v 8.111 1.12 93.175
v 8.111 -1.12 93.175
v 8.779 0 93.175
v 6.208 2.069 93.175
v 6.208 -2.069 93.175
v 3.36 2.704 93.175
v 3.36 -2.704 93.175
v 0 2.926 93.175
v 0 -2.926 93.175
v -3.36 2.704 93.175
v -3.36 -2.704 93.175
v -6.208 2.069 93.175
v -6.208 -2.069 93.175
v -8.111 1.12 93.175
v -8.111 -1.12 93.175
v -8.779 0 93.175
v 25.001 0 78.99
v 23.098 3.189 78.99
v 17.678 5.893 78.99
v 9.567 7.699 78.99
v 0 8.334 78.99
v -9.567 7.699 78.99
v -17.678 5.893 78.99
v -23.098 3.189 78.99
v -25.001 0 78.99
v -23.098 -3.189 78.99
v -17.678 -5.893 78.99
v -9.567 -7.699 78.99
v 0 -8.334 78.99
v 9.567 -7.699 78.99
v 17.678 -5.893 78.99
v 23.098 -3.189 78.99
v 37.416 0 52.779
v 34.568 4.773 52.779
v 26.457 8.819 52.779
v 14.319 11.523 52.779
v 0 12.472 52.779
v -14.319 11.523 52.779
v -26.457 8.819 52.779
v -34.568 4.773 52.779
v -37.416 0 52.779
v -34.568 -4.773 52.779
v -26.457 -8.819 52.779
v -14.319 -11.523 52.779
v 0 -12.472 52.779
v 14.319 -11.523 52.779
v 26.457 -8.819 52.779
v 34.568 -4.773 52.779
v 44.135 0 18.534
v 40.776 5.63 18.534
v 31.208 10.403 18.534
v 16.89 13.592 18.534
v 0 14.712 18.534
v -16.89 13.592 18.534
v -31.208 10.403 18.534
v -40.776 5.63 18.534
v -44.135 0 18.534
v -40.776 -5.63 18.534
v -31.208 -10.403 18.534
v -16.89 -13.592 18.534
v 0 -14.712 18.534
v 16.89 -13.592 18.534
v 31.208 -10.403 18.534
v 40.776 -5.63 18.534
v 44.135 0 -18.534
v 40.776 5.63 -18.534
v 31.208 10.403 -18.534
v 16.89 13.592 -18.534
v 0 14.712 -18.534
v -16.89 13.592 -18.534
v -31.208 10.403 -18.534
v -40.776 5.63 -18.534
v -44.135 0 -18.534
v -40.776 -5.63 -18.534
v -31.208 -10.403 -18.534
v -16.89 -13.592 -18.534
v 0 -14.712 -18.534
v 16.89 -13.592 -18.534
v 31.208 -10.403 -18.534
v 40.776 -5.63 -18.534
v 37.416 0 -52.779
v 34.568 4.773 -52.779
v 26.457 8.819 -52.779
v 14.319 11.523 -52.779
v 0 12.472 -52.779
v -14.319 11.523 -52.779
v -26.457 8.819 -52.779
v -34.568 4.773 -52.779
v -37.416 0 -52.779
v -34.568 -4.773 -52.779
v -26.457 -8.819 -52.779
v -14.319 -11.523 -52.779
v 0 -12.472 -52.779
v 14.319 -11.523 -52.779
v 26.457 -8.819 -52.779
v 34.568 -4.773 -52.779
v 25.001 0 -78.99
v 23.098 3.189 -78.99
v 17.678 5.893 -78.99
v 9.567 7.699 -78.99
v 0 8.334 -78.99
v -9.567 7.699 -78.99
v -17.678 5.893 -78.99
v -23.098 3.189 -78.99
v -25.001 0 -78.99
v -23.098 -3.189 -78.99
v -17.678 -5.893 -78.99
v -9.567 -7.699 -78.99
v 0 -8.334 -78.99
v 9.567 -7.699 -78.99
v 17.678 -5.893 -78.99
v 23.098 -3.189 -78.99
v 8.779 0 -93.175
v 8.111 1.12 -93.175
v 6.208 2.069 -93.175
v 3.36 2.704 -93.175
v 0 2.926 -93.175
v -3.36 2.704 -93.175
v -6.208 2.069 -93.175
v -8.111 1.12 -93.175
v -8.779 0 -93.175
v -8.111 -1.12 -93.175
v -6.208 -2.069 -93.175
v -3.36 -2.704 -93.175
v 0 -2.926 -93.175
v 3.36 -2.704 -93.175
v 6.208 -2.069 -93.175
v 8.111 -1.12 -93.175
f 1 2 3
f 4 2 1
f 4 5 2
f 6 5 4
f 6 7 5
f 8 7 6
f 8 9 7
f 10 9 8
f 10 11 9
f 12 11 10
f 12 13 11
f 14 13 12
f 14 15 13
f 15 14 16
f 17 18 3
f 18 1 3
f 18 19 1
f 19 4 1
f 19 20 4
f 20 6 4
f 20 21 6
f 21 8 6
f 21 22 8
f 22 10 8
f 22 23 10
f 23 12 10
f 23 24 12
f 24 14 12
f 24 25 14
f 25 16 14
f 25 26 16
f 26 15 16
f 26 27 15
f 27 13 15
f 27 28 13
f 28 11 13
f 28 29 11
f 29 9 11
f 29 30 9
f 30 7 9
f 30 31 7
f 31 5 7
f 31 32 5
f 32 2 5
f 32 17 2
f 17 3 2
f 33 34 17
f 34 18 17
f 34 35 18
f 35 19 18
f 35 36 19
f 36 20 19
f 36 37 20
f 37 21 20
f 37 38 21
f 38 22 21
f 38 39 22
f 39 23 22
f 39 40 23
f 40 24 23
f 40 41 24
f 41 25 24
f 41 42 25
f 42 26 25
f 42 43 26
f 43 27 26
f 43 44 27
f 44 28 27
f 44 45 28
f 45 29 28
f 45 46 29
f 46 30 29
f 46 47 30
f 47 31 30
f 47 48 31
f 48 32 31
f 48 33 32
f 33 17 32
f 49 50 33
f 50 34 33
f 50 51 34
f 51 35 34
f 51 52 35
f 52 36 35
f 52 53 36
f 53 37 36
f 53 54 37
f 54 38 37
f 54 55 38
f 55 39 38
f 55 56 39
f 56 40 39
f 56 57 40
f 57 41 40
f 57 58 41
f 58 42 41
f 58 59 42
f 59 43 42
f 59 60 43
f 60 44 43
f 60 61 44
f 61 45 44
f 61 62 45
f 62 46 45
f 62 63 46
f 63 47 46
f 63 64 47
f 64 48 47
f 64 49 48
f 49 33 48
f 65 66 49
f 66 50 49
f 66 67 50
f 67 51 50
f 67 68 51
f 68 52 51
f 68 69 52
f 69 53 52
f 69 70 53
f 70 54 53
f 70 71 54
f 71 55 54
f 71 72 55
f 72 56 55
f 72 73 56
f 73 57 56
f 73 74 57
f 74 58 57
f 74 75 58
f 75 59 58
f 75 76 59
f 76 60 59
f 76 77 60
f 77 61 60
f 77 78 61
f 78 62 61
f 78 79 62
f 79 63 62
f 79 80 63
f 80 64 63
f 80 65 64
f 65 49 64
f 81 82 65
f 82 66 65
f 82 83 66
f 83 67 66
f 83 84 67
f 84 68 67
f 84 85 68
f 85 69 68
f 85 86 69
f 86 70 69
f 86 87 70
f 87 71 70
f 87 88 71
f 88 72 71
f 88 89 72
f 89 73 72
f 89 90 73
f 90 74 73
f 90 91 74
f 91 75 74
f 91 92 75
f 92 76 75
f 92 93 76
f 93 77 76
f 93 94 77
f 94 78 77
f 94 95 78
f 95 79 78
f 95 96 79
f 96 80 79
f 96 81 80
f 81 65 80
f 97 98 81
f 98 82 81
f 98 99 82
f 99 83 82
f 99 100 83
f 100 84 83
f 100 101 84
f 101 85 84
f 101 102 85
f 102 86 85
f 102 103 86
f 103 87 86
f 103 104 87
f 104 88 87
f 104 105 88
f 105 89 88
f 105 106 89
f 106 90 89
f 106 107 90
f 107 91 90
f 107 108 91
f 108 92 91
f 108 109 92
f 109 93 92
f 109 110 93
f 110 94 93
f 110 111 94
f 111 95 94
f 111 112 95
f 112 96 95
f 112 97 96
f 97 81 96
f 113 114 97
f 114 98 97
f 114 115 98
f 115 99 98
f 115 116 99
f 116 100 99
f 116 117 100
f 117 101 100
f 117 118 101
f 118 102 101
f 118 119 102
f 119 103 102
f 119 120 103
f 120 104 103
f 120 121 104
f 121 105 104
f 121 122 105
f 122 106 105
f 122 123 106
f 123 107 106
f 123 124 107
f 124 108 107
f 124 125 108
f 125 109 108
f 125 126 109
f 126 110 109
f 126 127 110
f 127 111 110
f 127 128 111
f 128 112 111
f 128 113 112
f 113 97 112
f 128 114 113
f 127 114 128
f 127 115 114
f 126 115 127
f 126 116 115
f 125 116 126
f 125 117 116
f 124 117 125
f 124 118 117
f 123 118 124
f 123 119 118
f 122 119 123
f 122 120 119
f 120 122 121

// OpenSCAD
// Generated by SolidPython 1.0.1 on 2020-07-29 00:46:48


scale(v = [9, 3, 19]) {
	sphere(r = 5);
}
/***********************************************
*********      SolidPython code:      **********
************************************************
 
# import packages: SolidPython
from solid import *
from solid.utils import *
from itertools import chain, combinations, permutations


class Resize:

    def __init__(self, scad_file):
        self.scad_file = scad_file
        #self.scad_file = import_scad(scad_file)
        # cone/cylinder param:
        self.r1 = 0
        self.r2 = 0
        self.h = 0
        # rectangular prism param:
        self.w = 0
        self.l = 0
        # ellipse param:
        self.r = 0

    # import OpenScad code (file name corresponds to shape)


    # classify shape + parameters
    def assign(self, param1, param2, param3):
        if self.scad_file == 'cone.scad':
            self.r1 = param1
            self.r2 = param2
            self.h = param3
        elif self.scad_file == 'cylinder.scad':
            self.r1 = param1
            self.r2 = param2
            self.h = param3
        elif self.scad_file == 'rectangularPrism.scad':
            self.h = param1
            self.l = param2
            self.w = param3
        else:
            self.r = param1
            self.h = param2

    # resize parameters
    def iterate(self):
        x = range(3, 20, 2)
        i = 1
        if self.scad_file == 'cone.scad':
            tempList = list(permutations(x, 2))
            for temp in tempList:
                param1 = temp[0]
                param2 = temp[1]
                filepath = 'produced_scad_files/' + 'cone' + str(param1) + '_' + str(param2) + '_' + '.scad'
                scad_render_to_file(cylinder(h=param1, r1=param2, r2=0), filepath)

        elif self.scad_file == 'cylinder.scad':
            tempList = list(permutations(x, 3))
            for temp in tempList:
                param1 = temp[0]
                param2 = temp[1]
                filepath = 'produced_scad_files/' + 'cylinder' + str(param1) + '_' + str(param2) + '_' + '.scad'
                scad_render_to_file(cylinder(h=param1, r1=param2, r2=param2), filepath)

        elif self.scad_file == 'rectangularPrism.scad':
            tempList = list(permutations(x, 3))
            for temp in tempList:
                param1 = temp[0]
                param2 = temp[1]
                param3 = temp[2]
                filepath = 'produced_scad_files/' + 'rectangularPrism' + str(param1) + '_' + str(param2) + '_' + str(
                    param3) + '.scad'
                scad_render_to_file(cube(size=(param1, param2, param3)), filepath)

        elif self.scad_file == 'ellipse.scad':
            tempList = list(permutations(x, 4))
            for temp in tempList:
                param1 = temp[0]
                param2 = temp[1]
                param3 = temp[2]
                param4 = temp[3]
                filepath = 'produced_scad_files/' + 'ellipse' + str(param1) + '_' + str(param2) + '_' + str(param3) + '_' + str(param4) + '.scad'
                scad_render_to_file(scale([param1, param2, param3])(sphere(r=param4)), filepath)

    def render_to_scadfile(self):
        scad_render_to_file(scad, 'example.scad') 
 
************************************************/
